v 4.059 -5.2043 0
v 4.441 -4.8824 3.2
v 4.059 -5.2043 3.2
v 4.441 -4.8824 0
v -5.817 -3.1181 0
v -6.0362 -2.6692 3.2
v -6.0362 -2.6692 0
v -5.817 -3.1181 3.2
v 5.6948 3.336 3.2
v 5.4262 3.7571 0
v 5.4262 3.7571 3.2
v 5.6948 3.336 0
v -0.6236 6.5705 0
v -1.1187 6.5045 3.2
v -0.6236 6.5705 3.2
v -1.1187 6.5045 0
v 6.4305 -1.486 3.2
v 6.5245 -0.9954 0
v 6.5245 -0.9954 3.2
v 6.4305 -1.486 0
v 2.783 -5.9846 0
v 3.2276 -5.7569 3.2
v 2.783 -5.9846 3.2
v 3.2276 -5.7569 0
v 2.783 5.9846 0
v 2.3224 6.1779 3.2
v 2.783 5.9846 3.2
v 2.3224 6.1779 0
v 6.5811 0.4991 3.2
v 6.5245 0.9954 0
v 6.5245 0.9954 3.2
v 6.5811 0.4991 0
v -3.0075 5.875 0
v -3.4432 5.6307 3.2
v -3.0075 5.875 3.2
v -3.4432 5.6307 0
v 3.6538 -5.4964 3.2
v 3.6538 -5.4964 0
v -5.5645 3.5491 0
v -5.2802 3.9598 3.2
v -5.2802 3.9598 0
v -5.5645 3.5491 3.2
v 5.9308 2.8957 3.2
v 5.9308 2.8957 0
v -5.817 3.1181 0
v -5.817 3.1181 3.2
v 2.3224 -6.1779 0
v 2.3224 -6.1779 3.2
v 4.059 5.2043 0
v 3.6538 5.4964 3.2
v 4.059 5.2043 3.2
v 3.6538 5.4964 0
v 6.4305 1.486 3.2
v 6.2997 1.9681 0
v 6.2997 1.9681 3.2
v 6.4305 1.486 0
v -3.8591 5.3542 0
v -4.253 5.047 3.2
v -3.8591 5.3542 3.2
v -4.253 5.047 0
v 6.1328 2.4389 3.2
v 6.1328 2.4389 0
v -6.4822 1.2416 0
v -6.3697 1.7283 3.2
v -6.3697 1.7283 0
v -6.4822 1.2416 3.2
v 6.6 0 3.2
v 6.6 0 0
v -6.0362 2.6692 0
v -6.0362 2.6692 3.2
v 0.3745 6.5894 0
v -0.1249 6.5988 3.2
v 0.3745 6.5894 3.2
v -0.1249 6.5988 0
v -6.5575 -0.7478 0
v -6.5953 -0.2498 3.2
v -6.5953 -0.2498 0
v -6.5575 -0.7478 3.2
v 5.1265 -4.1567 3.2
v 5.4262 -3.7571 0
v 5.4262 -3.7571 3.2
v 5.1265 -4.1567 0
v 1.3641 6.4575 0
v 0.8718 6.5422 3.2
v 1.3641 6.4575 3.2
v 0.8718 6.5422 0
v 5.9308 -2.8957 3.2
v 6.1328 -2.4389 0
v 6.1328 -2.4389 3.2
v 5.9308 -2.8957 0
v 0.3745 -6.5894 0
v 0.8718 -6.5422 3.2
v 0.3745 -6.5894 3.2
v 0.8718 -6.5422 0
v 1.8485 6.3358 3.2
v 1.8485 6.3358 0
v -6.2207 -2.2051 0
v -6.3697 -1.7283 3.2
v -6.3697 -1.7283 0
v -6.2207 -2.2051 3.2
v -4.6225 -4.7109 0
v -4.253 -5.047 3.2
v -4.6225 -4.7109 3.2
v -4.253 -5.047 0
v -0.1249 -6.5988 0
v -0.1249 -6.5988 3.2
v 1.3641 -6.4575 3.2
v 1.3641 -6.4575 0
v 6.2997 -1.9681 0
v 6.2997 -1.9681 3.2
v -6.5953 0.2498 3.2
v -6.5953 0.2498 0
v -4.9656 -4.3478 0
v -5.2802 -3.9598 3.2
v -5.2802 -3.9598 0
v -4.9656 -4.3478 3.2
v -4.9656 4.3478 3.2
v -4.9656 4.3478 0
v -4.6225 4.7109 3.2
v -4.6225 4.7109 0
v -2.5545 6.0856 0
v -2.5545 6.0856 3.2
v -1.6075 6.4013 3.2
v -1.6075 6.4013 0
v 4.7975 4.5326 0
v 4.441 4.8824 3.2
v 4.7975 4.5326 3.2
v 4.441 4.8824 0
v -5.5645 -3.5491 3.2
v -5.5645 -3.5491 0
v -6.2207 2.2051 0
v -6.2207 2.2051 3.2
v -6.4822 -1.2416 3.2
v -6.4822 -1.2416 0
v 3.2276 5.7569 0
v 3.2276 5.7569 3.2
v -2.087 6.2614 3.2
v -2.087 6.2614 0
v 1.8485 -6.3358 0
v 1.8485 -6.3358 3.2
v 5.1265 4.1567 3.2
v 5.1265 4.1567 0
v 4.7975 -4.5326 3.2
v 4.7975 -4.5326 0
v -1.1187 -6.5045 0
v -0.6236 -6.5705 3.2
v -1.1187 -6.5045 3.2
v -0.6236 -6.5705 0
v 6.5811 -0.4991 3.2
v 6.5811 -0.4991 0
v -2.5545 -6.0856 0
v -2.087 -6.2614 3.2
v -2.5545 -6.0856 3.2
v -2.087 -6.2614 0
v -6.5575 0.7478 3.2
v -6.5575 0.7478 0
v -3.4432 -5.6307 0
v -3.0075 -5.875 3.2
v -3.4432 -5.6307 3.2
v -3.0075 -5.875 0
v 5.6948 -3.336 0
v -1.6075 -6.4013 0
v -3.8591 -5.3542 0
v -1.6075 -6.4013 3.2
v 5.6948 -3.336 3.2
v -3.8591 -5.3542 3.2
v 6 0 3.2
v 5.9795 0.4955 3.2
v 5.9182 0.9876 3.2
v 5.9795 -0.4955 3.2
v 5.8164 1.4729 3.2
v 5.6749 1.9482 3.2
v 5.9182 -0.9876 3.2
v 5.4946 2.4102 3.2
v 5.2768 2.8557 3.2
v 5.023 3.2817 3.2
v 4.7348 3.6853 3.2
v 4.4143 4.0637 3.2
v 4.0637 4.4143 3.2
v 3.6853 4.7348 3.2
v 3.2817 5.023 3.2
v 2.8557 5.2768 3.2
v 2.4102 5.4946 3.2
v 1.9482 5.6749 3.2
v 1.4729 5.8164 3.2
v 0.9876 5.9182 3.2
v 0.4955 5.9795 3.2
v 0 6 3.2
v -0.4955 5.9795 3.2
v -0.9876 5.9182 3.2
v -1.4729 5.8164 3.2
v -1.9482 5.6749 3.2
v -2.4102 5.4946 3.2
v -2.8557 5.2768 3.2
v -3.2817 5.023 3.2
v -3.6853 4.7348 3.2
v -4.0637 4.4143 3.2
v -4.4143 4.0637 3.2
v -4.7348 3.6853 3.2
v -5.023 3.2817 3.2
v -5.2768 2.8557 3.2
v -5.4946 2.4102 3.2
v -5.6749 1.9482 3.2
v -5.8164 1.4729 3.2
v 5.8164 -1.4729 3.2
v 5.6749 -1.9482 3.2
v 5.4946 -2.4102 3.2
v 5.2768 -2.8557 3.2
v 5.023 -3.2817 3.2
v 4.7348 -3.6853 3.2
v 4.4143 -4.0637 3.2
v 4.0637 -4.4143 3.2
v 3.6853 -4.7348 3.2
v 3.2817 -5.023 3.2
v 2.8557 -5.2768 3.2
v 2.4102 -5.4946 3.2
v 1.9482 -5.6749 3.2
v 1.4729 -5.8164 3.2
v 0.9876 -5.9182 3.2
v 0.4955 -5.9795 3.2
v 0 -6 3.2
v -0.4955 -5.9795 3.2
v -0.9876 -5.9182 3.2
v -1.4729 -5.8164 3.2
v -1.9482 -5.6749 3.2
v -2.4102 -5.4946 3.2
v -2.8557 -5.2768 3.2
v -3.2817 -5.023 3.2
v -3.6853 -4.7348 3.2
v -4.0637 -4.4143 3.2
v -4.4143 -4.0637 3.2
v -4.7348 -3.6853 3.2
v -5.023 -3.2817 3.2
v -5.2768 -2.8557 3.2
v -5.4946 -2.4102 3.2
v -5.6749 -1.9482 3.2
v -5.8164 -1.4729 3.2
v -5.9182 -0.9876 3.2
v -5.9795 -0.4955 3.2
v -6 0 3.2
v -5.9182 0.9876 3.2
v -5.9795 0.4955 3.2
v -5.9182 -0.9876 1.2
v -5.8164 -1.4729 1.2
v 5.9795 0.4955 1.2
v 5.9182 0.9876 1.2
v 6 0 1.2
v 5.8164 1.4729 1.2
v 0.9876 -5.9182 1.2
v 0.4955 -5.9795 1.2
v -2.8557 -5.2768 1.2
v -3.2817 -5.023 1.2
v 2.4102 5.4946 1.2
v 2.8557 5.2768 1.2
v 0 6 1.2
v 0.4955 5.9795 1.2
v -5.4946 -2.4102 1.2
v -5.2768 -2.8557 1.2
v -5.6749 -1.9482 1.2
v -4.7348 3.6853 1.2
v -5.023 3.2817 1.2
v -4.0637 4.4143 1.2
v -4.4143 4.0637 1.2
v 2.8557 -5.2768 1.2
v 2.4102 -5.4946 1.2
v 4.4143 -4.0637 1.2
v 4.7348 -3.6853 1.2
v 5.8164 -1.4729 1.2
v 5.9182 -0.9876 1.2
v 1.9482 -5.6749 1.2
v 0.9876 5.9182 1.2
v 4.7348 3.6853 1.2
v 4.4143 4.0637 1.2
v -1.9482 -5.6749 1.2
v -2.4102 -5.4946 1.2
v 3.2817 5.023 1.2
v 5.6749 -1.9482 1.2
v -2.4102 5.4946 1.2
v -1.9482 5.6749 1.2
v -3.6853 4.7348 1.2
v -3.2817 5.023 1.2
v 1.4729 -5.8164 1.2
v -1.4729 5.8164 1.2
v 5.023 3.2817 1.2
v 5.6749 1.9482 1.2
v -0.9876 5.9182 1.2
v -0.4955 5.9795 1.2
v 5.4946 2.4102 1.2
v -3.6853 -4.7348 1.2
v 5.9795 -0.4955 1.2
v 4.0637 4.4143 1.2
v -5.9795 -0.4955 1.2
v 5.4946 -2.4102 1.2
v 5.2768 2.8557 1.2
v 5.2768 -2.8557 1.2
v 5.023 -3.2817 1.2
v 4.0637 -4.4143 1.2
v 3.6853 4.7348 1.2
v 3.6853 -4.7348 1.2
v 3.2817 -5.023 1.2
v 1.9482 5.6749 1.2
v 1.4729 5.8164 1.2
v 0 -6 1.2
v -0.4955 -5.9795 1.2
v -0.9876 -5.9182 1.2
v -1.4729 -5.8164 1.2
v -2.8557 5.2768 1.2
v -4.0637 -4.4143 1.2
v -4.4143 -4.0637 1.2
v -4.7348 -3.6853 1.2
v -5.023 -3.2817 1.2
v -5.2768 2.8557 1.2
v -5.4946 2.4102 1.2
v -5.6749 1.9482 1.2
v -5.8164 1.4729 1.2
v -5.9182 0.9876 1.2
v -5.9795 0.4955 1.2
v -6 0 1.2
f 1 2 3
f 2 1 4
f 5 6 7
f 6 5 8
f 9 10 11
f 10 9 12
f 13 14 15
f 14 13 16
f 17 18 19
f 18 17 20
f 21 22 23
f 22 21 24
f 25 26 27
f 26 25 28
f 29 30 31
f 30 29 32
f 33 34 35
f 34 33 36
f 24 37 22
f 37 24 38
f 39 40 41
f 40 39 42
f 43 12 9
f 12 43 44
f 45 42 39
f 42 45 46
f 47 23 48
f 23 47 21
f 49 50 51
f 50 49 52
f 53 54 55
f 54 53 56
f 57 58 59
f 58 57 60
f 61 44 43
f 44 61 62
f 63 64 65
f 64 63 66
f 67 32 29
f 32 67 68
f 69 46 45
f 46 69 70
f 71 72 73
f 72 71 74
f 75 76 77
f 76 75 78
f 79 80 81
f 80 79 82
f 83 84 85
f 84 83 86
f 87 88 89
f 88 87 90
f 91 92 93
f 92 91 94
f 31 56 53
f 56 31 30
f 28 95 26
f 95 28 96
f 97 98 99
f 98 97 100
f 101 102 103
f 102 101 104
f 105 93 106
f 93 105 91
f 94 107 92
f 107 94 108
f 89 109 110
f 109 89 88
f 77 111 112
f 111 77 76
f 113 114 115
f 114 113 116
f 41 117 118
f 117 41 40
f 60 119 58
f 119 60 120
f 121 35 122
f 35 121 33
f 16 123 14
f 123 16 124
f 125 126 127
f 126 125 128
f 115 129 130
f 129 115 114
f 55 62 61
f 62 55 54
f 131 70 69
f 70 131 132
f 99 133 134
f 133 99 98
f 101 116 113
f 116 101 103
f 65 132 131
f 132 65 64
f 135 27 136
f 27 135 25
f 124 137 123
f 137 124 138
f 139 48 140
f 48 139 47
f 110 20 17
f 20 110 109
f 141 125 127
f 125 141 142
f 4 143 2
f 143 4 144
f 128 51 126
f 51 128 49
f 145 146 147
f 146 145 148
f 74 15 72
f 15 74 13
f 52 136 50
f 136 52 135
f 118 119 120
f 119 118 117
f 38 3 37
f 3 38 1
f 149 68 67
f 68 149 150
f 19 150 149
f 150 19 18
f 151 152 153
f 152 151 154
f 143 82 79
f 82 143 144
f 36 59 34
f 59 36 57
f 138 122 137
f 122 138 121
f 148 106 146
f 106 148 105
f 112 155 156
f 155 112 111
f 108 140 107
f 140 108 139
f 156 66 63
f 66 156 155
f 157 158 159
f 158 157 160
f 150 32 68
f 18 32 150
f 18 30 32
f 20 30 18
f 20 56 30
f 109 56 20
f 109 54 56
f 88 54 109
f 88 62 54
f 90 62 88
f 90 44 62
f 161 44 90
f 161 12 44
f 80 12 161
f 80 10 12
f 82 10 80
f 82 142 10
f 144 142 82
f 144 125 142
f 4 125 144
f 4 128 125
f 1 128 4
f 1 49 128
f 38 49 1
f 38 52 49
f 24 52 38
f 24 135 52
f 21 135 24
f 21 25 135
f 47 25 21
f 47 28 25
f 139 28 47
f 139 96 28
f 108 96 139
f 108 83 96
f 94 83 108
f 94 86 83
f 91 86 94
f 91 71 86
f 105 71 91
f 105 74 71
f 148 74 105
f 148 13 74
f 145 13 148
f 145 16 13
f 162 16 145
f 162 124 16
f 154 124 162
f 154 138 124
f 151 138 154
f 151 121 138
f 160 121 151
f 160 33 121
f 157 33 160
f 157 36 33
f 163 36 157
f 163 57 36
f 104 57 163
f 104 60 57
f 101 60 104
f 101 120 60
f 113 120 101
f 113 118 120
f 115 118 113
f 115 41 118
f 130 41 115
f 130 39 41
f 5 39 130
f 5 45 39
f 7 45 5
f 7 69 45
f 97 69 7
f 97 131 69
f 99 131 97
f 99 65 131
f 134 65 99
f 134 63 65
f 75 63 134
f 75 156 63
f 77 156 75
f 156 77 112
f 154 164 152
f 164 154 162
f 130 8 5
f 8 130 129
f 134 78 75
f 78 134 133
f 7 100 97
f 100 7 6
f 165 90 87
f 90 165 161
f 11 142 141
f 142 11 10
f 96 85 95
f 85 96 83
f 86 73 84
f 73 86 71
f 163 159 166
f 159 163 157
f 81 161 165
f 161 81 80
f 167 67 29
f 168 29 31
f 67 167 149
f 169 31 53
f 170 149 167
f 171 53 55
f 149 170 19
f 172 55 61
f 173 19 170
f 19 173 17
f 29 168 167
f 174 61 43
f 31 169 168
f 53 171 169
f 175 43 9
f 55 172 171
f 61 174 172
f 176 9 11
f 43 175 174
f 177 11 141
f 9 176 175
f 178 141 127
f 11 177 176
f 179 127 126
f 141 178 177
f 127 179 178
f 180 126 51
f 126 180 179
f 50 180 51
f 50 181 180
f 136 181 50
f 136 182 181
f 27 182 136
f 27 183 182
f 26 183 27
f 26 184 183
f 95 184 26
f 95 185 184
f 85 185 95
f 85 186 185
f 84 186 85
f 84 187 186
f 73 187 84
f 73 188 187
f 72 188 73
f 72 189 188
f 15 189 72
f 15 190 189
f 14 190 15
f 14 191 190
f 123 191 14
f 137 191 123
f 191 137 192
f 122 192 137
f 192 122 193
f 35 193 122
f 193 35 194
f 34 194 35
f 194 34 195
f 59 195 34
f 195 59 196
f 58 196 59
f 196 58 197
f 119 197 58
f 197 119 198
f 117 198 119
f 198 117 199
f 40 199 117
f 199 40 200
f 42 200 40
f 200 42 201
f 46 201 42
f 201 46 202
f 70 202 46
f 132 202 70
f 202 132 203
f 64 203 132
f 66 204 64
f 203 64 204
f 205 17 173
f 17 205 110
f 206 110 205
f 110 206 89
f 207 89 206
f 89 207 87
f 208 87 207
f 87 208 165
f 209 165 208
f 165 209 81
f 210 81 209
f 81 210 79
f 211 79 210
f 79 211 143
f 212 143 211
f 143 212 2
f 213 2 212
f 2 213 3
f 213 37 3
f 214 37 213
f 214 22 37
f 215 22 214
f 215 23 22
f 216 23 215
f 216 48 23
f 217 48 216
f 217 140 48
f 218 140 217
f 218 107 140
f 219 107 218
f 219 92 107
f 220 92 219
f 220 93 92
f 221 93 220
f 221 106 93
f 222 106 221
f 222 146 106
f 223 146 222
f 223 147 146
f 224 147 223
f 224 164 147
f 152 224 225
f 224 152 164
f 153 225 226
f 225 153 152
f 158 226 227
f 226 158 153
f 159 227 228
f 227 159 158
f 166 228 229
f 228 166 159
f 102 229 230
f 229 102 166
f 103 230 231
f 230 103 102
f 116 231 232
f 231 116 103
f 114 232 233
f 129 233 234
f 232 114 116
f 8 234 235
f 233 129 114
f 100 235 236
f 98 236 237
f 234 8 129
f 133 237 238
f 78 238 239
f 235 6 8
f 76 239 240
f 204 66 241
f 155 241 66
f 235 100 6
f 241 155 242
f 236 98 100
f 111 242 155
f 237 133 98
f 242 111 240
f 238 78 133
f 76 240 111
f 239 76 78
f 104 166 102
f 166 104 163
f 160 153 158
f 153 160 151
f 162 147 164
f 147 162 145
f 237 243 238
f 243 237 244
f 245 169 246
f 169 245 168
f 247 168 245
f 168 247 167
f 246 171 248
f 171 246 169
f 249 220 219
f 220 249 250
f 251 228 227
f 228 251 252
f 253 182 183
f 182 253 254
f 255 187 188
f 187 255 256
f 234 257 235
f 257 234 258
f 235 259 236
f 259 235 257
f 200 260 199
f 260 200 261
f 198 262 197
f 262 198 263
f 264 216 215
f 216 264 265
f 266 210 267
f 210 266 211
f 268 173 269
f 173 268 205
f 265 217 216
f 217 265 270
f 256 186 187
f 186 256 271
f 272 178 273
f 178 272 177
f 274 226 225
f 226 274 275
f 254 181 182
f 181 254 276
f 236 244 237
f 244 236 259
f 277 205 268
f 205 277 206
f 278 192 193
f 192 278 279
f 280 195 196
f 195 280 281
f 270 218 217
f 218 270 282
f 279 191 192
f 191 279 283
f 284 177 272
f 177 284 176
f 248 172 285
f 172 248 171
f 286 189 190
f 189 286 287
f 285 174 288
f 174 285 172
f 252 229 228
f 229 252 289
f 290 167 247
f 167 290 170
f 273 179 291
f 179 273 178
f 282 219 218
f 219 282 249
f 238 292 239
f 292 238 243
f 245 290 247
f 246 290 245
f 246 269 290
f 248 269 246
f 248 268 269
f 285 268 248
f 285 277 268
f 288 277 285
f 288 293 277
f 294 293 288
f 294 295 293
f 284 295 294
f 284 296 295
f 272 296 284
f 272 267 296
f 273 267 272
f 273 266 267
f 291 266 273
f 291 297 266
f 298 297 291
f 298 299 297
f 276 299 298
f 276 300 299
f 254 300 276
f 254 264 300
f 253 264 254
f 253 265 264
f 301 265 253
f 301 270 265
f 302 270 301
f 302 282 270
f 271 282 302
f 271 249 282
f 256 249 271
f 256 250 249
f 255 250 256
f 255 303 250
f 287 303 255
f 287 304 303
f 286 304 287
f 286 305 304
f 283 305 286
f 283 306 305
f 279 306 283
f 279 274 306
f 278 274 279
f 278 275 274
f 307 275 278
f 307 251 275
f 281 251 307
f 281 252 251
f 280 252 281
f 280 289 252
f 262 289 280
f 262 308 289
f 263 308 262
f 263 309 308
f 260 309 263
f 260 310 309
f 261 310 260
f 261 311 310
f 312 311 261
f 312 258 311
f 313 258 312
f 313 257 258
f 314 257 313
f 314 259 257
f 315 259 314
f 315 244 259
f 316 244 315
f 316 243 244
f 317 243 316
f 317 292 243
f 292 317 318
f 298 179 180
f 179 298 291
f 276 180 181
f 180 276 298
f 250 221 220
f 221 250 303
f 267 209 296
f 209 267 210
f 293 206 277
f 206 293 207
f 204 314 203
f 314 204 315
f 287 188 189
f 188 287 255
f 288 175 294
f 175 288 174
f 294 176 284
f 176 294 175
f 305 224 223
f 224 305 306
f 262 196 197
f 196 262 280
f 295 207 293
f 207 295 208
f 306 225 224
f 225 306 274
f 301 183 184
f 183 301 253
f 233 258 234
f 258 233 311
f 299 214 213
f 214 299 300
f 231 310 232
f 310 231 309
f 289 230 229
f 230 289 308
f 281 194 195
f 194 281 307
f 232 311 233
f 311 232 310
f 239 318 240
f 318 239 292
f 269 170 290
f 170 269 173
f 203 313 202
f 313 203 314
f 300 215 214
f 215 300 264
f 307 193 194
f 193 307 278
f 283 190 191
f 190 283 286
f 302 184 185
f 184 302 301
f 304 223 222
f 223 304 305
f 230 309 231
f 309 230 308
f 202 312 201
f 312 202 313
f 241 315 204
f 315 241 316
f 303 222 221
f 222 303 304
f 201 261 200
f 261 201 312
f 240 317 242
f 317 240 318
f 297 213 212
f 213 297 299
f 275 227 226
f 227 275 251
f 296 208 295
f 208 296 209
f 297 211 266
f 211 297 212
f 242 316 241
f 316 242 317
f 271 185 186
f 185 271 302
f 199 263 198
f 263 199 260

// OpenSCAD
$fa=0.5;
$fs=0.5;

difference() {
    cylinder(h = 3.2, d = 13.2);
    
    translate([0, 0, 1.2])
        cylinder(h = 3.2, d = 12);
}  
